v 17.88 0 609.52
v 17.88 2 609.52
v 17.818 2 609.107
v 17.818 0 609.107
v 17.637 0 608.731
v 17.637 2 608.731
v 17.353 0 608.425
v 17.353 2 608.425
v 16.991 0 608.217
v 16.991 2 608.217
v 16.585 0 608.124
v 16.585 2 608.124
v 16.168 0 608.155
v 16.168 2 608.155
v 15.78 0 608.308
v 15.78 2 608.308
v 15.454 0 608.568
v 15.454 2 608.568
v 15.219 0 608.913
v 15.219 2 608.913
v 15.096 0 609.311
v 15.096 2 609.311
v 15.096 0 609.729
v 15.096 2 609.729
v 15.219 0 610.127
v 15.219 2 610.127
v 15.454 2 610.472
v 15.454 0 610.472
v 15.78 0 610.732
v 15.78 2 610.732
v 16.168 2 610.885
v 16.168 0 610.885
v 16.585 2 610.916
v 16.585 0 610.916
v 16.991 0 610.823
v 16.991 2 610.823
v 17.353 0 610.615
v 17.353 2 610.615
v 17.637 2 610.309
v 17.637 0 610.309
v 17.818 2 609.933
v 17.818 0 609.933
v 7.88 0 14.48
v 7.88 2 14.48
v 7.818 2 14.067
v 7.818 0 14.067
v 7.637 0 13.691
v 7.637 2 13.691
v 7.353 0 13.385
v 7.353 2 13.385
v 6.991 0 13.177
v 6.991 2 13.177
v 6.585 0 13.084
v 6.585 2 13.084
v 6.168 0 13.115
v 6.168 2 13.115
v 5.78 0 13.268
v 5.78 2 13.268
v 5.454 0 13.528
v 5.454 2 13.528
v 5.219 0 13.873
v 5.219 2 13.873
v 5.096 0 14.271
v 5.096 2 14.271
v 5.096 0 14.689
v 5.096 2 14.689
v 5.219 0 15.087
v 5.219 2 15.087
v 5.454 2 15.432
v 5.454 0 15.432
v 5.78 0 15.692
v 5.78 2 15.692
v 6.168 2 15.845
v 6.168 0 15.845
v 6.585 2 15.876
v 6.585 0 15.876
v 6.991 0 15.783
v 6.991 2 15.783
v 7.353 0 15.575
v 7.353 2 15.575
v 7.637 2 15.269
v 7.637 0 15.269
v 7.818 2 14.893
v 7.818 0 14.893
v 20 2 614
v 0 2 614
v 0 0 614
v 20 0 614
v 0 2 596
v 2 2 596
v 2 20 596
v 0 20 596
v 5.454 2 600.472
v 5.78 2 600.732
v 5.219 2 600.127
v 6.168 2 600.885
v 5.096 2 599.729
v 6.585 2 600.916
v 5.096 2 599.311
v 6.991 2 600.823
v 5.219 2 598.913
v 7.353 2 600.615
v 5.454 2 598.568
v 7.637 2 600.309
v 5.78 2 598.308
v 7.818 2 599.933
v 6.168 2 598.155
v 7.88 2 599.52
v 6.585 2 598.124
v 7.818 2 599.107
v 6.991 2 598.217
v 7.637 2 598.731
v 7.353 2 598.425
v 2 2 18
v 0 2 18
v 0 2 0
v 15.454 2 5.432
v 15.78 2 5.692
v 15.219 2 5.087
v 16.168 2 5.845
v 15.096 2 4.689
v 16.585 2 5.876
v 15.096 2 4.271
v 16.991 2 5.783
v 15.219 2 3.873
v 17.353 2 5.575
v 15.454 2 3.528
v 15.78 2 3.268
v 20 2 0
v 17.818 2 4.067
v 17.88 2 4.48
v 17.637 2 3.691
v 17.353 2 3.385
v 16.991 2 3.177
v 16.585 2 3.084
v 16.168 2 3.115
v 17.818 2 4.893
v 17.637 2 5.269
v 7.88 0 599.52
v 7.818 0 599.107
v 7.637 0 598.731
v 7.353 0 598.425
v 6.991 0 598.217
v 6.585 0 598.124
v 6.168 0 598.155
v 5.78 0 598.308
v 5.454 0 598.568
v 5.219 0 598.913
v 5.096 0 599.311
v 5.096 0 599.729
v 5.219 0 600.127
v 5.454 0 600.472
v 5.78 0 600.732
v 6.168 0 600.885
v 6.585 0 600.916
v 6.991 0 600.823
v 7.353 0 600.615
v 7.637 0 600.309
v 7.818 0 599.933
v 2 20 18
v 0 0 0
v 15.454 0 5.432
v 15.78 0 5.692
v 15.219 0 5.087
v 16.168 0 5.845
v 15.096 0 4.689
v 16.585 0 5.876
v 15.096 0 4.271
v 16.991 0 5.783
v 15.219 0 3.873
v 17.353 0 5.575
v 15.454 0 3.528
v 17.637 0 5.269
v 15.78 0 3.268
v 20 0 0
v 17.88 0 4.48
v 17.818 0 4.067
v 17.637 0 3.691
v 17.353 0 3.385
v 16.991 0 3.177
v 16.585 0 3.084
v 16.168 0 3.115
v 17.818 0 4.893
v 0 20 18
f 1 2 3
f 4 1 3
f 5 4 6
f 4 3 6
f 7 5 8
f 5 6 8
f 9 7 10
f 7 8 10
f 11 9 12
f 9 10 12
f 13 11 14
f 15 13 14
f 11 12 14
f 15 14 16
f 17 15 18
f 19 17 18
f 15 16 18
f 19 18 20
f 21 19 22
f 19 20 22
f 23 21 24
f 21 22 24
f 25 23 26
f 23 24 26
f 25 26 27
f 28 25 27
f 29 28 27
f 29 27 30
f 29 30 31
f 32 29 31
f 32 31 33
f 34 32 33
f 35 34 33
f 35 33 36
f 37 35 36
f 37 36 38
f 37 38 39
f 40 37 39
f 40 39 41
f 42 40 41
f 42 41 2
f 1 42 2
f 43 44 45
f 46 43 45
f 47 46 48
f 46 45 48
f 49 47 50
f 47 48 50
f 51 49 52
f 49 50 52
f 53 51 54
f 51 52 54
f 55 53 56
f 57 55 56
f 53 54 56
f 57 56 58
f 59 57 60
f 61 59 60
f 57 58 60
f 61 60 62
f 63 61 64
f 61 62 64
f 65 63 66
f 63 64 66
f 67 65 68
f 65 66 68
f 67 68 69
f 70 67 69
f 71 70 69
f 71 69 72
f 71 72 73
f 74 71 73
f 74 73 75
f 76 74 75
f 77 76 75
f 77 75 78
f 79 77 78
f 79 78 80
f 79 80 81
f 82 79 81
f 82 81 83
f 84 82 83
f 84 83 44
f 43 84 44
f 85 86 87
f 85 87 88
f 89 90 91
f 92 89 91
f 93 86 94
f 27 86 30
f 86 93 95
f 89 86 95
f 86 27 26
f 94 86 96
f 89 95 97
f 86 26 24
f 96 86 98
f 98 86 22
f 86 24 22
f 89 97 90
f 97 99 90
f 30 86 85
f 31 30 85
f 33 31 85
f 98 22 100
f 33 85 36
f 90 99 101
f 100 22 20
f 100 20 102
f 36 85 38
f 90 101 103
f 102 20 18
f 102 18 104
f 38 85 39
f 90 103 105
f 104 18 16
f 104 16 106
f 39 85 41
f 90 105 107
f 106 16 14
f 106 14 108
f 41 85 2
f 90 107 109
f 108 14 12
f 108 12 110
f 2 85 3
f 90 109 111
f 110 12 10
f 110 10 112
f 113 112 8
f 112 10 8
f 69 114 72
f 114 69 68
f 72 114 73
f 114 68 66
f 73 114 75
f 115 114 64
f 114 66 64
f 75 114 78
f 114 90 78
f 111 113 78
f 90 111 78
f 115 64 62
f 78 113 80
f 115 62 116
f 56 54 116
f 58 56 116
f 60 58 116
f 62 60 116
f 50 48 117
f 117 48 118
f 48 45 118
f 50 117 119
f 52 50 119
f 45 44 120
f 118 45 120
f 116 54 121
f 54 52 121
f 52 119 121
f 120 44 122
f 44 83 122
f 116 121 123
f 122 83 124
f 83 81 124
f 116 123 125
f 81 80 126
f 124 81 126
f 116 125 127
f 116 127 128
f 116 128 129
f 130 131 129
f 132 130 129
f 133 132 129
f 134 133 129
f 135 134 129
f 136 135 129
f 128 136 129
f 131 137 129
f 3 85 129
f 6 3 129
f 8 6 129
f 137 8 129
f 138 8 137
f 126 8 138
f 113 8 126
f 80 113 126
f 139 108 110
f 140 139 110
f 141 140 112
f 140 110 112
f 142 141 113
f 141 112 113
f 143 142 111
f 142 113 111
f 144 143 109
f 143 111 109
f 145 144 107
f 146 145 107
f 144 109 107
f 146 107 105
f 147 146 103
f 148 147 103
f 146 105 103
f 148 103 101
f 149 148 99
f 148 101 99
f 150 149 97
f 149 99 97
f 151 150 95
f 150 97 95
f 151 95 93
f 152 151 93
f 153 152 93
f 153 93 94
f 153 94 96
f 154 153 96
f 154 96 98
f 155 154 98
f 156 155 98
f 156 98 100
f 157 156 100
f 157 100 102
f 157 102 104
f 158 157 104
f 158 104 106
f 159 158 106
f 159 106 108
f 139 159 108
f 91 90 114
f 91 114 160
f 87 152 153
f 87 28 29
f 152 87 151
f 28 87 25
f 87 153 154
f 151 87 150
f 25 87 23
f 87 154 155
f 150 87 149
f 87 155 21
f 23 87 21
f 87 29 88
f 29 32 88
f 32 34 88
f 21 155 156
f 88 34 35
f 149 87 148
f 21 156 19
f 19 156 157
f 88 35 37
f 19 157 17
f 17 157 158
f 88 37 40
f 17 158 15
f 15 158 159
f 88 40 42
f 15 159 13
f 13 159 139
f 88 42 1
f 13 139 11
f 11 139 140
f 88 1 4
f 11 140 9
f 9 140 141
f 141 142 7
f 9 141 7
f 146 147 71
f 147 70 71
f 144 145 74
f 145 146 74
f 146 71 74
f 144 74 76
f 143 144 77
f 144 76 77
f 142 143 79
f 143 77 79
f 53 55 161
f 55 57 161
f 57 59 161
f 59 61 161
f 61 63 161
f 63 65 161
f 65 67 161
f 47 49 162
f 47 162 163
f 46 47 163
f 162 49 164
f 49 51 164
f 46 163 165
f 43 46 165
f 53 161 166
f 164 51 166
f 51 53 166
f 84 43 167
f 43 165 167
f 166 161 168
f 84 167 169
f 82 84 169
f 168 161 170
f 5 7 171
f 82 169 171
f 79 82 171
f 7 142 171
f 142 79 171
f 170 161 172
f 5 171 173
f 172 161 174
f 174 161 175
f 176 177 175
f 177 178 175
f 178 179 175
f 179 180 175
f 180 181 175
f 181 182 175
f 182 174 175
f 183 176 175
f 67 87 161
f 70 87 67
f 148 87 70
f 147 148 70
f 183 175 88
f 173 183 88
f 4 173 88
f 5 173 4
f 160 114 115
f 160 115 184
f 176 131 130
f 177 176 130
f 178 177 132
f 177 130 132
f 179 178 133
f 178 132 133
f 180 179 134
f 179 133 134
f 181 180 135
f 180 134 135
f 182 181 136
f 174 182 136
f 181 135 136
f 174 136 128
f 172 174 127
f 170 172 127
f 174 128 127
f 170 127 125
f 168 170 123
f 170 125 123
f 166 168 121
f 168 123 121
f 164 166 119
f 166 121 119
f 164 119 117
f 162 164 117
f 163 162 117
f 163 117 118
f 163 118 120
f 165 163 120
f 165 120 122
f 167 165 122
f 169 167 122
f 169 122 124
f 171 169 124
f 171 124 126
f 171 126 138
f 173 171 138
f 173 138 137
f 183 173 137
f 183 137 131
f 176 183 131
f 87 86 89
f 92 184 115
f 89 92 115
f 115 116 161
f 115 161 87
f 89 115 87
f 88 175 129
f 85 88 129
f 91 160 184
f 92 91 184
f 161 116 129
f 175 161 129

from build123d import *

# Parameters (mm, degrees)
BOSS_EXTRU_1_DEPTH      = 614
ESQUISSE2_W             = 18
ESQUISSE2_H             = 18
ENL_V_MAT_EXTRU_1_DEPTH = 3
ESQUISSE6_R             = 1.4
ENL_V_MAT_EXTRU_5_DEPTH = 3


with BuildPart() as part:
    # Esquisse1 → Boss.-Extru.1 (new body)
    with BuildSketch(Plane.XY):
        Polygon((0, 0), (20, 0), (20, 2), (2, 2), (2, 20), (0, 20), align=None)
    extrude(amount=BOSS_EXTRU_1_DEPTH)

    # Esquisse2 → Enlèv. mat.-Extru.1 (cut, through all)
    with BuildSketch(Plane(origin=(2, 0, 0), x_dir=(0, 0, -1), z_dir=(1, 0, 0))):
        with Locations((-605, 11)):
            Rectangle(ESQUISSE2_W, ESQUISSE2_H)
        with Locations((-9, 11)):
            Rectangle(ESQUISSE2_W, ESQUISSE2_H)
    extrude(amount=-ENL_V_MAT_EXTRU_1_DEPTH, mode=Mode.SUBTRACT)

    # Esquisse6 → Enlèv. mat.-Extru.5 (cut, through all)
    with BuildSketch(Plane(origin=(0, 2, 0), x_dir=(1, 0, 0), z_dir=(0, 1, 0))):
        with Locations((6.48, -599.52)):
            Circle(ESQUISSE6_R)
        with Locations((6.48, -14.48)):
            Circle(ESQUISSE6_R)
        with Locations((16.48, -609.52)):
            Circle(ESQUISSE6_R)
        with Locations((16.48, -4.48)):
            Circle(ESQUISSE6_R)
    extrude(amount=-ENL_V_MAT_EXTRU_5_DEPTH, mode=Mode.SUBTRACT)


solid = part.part
